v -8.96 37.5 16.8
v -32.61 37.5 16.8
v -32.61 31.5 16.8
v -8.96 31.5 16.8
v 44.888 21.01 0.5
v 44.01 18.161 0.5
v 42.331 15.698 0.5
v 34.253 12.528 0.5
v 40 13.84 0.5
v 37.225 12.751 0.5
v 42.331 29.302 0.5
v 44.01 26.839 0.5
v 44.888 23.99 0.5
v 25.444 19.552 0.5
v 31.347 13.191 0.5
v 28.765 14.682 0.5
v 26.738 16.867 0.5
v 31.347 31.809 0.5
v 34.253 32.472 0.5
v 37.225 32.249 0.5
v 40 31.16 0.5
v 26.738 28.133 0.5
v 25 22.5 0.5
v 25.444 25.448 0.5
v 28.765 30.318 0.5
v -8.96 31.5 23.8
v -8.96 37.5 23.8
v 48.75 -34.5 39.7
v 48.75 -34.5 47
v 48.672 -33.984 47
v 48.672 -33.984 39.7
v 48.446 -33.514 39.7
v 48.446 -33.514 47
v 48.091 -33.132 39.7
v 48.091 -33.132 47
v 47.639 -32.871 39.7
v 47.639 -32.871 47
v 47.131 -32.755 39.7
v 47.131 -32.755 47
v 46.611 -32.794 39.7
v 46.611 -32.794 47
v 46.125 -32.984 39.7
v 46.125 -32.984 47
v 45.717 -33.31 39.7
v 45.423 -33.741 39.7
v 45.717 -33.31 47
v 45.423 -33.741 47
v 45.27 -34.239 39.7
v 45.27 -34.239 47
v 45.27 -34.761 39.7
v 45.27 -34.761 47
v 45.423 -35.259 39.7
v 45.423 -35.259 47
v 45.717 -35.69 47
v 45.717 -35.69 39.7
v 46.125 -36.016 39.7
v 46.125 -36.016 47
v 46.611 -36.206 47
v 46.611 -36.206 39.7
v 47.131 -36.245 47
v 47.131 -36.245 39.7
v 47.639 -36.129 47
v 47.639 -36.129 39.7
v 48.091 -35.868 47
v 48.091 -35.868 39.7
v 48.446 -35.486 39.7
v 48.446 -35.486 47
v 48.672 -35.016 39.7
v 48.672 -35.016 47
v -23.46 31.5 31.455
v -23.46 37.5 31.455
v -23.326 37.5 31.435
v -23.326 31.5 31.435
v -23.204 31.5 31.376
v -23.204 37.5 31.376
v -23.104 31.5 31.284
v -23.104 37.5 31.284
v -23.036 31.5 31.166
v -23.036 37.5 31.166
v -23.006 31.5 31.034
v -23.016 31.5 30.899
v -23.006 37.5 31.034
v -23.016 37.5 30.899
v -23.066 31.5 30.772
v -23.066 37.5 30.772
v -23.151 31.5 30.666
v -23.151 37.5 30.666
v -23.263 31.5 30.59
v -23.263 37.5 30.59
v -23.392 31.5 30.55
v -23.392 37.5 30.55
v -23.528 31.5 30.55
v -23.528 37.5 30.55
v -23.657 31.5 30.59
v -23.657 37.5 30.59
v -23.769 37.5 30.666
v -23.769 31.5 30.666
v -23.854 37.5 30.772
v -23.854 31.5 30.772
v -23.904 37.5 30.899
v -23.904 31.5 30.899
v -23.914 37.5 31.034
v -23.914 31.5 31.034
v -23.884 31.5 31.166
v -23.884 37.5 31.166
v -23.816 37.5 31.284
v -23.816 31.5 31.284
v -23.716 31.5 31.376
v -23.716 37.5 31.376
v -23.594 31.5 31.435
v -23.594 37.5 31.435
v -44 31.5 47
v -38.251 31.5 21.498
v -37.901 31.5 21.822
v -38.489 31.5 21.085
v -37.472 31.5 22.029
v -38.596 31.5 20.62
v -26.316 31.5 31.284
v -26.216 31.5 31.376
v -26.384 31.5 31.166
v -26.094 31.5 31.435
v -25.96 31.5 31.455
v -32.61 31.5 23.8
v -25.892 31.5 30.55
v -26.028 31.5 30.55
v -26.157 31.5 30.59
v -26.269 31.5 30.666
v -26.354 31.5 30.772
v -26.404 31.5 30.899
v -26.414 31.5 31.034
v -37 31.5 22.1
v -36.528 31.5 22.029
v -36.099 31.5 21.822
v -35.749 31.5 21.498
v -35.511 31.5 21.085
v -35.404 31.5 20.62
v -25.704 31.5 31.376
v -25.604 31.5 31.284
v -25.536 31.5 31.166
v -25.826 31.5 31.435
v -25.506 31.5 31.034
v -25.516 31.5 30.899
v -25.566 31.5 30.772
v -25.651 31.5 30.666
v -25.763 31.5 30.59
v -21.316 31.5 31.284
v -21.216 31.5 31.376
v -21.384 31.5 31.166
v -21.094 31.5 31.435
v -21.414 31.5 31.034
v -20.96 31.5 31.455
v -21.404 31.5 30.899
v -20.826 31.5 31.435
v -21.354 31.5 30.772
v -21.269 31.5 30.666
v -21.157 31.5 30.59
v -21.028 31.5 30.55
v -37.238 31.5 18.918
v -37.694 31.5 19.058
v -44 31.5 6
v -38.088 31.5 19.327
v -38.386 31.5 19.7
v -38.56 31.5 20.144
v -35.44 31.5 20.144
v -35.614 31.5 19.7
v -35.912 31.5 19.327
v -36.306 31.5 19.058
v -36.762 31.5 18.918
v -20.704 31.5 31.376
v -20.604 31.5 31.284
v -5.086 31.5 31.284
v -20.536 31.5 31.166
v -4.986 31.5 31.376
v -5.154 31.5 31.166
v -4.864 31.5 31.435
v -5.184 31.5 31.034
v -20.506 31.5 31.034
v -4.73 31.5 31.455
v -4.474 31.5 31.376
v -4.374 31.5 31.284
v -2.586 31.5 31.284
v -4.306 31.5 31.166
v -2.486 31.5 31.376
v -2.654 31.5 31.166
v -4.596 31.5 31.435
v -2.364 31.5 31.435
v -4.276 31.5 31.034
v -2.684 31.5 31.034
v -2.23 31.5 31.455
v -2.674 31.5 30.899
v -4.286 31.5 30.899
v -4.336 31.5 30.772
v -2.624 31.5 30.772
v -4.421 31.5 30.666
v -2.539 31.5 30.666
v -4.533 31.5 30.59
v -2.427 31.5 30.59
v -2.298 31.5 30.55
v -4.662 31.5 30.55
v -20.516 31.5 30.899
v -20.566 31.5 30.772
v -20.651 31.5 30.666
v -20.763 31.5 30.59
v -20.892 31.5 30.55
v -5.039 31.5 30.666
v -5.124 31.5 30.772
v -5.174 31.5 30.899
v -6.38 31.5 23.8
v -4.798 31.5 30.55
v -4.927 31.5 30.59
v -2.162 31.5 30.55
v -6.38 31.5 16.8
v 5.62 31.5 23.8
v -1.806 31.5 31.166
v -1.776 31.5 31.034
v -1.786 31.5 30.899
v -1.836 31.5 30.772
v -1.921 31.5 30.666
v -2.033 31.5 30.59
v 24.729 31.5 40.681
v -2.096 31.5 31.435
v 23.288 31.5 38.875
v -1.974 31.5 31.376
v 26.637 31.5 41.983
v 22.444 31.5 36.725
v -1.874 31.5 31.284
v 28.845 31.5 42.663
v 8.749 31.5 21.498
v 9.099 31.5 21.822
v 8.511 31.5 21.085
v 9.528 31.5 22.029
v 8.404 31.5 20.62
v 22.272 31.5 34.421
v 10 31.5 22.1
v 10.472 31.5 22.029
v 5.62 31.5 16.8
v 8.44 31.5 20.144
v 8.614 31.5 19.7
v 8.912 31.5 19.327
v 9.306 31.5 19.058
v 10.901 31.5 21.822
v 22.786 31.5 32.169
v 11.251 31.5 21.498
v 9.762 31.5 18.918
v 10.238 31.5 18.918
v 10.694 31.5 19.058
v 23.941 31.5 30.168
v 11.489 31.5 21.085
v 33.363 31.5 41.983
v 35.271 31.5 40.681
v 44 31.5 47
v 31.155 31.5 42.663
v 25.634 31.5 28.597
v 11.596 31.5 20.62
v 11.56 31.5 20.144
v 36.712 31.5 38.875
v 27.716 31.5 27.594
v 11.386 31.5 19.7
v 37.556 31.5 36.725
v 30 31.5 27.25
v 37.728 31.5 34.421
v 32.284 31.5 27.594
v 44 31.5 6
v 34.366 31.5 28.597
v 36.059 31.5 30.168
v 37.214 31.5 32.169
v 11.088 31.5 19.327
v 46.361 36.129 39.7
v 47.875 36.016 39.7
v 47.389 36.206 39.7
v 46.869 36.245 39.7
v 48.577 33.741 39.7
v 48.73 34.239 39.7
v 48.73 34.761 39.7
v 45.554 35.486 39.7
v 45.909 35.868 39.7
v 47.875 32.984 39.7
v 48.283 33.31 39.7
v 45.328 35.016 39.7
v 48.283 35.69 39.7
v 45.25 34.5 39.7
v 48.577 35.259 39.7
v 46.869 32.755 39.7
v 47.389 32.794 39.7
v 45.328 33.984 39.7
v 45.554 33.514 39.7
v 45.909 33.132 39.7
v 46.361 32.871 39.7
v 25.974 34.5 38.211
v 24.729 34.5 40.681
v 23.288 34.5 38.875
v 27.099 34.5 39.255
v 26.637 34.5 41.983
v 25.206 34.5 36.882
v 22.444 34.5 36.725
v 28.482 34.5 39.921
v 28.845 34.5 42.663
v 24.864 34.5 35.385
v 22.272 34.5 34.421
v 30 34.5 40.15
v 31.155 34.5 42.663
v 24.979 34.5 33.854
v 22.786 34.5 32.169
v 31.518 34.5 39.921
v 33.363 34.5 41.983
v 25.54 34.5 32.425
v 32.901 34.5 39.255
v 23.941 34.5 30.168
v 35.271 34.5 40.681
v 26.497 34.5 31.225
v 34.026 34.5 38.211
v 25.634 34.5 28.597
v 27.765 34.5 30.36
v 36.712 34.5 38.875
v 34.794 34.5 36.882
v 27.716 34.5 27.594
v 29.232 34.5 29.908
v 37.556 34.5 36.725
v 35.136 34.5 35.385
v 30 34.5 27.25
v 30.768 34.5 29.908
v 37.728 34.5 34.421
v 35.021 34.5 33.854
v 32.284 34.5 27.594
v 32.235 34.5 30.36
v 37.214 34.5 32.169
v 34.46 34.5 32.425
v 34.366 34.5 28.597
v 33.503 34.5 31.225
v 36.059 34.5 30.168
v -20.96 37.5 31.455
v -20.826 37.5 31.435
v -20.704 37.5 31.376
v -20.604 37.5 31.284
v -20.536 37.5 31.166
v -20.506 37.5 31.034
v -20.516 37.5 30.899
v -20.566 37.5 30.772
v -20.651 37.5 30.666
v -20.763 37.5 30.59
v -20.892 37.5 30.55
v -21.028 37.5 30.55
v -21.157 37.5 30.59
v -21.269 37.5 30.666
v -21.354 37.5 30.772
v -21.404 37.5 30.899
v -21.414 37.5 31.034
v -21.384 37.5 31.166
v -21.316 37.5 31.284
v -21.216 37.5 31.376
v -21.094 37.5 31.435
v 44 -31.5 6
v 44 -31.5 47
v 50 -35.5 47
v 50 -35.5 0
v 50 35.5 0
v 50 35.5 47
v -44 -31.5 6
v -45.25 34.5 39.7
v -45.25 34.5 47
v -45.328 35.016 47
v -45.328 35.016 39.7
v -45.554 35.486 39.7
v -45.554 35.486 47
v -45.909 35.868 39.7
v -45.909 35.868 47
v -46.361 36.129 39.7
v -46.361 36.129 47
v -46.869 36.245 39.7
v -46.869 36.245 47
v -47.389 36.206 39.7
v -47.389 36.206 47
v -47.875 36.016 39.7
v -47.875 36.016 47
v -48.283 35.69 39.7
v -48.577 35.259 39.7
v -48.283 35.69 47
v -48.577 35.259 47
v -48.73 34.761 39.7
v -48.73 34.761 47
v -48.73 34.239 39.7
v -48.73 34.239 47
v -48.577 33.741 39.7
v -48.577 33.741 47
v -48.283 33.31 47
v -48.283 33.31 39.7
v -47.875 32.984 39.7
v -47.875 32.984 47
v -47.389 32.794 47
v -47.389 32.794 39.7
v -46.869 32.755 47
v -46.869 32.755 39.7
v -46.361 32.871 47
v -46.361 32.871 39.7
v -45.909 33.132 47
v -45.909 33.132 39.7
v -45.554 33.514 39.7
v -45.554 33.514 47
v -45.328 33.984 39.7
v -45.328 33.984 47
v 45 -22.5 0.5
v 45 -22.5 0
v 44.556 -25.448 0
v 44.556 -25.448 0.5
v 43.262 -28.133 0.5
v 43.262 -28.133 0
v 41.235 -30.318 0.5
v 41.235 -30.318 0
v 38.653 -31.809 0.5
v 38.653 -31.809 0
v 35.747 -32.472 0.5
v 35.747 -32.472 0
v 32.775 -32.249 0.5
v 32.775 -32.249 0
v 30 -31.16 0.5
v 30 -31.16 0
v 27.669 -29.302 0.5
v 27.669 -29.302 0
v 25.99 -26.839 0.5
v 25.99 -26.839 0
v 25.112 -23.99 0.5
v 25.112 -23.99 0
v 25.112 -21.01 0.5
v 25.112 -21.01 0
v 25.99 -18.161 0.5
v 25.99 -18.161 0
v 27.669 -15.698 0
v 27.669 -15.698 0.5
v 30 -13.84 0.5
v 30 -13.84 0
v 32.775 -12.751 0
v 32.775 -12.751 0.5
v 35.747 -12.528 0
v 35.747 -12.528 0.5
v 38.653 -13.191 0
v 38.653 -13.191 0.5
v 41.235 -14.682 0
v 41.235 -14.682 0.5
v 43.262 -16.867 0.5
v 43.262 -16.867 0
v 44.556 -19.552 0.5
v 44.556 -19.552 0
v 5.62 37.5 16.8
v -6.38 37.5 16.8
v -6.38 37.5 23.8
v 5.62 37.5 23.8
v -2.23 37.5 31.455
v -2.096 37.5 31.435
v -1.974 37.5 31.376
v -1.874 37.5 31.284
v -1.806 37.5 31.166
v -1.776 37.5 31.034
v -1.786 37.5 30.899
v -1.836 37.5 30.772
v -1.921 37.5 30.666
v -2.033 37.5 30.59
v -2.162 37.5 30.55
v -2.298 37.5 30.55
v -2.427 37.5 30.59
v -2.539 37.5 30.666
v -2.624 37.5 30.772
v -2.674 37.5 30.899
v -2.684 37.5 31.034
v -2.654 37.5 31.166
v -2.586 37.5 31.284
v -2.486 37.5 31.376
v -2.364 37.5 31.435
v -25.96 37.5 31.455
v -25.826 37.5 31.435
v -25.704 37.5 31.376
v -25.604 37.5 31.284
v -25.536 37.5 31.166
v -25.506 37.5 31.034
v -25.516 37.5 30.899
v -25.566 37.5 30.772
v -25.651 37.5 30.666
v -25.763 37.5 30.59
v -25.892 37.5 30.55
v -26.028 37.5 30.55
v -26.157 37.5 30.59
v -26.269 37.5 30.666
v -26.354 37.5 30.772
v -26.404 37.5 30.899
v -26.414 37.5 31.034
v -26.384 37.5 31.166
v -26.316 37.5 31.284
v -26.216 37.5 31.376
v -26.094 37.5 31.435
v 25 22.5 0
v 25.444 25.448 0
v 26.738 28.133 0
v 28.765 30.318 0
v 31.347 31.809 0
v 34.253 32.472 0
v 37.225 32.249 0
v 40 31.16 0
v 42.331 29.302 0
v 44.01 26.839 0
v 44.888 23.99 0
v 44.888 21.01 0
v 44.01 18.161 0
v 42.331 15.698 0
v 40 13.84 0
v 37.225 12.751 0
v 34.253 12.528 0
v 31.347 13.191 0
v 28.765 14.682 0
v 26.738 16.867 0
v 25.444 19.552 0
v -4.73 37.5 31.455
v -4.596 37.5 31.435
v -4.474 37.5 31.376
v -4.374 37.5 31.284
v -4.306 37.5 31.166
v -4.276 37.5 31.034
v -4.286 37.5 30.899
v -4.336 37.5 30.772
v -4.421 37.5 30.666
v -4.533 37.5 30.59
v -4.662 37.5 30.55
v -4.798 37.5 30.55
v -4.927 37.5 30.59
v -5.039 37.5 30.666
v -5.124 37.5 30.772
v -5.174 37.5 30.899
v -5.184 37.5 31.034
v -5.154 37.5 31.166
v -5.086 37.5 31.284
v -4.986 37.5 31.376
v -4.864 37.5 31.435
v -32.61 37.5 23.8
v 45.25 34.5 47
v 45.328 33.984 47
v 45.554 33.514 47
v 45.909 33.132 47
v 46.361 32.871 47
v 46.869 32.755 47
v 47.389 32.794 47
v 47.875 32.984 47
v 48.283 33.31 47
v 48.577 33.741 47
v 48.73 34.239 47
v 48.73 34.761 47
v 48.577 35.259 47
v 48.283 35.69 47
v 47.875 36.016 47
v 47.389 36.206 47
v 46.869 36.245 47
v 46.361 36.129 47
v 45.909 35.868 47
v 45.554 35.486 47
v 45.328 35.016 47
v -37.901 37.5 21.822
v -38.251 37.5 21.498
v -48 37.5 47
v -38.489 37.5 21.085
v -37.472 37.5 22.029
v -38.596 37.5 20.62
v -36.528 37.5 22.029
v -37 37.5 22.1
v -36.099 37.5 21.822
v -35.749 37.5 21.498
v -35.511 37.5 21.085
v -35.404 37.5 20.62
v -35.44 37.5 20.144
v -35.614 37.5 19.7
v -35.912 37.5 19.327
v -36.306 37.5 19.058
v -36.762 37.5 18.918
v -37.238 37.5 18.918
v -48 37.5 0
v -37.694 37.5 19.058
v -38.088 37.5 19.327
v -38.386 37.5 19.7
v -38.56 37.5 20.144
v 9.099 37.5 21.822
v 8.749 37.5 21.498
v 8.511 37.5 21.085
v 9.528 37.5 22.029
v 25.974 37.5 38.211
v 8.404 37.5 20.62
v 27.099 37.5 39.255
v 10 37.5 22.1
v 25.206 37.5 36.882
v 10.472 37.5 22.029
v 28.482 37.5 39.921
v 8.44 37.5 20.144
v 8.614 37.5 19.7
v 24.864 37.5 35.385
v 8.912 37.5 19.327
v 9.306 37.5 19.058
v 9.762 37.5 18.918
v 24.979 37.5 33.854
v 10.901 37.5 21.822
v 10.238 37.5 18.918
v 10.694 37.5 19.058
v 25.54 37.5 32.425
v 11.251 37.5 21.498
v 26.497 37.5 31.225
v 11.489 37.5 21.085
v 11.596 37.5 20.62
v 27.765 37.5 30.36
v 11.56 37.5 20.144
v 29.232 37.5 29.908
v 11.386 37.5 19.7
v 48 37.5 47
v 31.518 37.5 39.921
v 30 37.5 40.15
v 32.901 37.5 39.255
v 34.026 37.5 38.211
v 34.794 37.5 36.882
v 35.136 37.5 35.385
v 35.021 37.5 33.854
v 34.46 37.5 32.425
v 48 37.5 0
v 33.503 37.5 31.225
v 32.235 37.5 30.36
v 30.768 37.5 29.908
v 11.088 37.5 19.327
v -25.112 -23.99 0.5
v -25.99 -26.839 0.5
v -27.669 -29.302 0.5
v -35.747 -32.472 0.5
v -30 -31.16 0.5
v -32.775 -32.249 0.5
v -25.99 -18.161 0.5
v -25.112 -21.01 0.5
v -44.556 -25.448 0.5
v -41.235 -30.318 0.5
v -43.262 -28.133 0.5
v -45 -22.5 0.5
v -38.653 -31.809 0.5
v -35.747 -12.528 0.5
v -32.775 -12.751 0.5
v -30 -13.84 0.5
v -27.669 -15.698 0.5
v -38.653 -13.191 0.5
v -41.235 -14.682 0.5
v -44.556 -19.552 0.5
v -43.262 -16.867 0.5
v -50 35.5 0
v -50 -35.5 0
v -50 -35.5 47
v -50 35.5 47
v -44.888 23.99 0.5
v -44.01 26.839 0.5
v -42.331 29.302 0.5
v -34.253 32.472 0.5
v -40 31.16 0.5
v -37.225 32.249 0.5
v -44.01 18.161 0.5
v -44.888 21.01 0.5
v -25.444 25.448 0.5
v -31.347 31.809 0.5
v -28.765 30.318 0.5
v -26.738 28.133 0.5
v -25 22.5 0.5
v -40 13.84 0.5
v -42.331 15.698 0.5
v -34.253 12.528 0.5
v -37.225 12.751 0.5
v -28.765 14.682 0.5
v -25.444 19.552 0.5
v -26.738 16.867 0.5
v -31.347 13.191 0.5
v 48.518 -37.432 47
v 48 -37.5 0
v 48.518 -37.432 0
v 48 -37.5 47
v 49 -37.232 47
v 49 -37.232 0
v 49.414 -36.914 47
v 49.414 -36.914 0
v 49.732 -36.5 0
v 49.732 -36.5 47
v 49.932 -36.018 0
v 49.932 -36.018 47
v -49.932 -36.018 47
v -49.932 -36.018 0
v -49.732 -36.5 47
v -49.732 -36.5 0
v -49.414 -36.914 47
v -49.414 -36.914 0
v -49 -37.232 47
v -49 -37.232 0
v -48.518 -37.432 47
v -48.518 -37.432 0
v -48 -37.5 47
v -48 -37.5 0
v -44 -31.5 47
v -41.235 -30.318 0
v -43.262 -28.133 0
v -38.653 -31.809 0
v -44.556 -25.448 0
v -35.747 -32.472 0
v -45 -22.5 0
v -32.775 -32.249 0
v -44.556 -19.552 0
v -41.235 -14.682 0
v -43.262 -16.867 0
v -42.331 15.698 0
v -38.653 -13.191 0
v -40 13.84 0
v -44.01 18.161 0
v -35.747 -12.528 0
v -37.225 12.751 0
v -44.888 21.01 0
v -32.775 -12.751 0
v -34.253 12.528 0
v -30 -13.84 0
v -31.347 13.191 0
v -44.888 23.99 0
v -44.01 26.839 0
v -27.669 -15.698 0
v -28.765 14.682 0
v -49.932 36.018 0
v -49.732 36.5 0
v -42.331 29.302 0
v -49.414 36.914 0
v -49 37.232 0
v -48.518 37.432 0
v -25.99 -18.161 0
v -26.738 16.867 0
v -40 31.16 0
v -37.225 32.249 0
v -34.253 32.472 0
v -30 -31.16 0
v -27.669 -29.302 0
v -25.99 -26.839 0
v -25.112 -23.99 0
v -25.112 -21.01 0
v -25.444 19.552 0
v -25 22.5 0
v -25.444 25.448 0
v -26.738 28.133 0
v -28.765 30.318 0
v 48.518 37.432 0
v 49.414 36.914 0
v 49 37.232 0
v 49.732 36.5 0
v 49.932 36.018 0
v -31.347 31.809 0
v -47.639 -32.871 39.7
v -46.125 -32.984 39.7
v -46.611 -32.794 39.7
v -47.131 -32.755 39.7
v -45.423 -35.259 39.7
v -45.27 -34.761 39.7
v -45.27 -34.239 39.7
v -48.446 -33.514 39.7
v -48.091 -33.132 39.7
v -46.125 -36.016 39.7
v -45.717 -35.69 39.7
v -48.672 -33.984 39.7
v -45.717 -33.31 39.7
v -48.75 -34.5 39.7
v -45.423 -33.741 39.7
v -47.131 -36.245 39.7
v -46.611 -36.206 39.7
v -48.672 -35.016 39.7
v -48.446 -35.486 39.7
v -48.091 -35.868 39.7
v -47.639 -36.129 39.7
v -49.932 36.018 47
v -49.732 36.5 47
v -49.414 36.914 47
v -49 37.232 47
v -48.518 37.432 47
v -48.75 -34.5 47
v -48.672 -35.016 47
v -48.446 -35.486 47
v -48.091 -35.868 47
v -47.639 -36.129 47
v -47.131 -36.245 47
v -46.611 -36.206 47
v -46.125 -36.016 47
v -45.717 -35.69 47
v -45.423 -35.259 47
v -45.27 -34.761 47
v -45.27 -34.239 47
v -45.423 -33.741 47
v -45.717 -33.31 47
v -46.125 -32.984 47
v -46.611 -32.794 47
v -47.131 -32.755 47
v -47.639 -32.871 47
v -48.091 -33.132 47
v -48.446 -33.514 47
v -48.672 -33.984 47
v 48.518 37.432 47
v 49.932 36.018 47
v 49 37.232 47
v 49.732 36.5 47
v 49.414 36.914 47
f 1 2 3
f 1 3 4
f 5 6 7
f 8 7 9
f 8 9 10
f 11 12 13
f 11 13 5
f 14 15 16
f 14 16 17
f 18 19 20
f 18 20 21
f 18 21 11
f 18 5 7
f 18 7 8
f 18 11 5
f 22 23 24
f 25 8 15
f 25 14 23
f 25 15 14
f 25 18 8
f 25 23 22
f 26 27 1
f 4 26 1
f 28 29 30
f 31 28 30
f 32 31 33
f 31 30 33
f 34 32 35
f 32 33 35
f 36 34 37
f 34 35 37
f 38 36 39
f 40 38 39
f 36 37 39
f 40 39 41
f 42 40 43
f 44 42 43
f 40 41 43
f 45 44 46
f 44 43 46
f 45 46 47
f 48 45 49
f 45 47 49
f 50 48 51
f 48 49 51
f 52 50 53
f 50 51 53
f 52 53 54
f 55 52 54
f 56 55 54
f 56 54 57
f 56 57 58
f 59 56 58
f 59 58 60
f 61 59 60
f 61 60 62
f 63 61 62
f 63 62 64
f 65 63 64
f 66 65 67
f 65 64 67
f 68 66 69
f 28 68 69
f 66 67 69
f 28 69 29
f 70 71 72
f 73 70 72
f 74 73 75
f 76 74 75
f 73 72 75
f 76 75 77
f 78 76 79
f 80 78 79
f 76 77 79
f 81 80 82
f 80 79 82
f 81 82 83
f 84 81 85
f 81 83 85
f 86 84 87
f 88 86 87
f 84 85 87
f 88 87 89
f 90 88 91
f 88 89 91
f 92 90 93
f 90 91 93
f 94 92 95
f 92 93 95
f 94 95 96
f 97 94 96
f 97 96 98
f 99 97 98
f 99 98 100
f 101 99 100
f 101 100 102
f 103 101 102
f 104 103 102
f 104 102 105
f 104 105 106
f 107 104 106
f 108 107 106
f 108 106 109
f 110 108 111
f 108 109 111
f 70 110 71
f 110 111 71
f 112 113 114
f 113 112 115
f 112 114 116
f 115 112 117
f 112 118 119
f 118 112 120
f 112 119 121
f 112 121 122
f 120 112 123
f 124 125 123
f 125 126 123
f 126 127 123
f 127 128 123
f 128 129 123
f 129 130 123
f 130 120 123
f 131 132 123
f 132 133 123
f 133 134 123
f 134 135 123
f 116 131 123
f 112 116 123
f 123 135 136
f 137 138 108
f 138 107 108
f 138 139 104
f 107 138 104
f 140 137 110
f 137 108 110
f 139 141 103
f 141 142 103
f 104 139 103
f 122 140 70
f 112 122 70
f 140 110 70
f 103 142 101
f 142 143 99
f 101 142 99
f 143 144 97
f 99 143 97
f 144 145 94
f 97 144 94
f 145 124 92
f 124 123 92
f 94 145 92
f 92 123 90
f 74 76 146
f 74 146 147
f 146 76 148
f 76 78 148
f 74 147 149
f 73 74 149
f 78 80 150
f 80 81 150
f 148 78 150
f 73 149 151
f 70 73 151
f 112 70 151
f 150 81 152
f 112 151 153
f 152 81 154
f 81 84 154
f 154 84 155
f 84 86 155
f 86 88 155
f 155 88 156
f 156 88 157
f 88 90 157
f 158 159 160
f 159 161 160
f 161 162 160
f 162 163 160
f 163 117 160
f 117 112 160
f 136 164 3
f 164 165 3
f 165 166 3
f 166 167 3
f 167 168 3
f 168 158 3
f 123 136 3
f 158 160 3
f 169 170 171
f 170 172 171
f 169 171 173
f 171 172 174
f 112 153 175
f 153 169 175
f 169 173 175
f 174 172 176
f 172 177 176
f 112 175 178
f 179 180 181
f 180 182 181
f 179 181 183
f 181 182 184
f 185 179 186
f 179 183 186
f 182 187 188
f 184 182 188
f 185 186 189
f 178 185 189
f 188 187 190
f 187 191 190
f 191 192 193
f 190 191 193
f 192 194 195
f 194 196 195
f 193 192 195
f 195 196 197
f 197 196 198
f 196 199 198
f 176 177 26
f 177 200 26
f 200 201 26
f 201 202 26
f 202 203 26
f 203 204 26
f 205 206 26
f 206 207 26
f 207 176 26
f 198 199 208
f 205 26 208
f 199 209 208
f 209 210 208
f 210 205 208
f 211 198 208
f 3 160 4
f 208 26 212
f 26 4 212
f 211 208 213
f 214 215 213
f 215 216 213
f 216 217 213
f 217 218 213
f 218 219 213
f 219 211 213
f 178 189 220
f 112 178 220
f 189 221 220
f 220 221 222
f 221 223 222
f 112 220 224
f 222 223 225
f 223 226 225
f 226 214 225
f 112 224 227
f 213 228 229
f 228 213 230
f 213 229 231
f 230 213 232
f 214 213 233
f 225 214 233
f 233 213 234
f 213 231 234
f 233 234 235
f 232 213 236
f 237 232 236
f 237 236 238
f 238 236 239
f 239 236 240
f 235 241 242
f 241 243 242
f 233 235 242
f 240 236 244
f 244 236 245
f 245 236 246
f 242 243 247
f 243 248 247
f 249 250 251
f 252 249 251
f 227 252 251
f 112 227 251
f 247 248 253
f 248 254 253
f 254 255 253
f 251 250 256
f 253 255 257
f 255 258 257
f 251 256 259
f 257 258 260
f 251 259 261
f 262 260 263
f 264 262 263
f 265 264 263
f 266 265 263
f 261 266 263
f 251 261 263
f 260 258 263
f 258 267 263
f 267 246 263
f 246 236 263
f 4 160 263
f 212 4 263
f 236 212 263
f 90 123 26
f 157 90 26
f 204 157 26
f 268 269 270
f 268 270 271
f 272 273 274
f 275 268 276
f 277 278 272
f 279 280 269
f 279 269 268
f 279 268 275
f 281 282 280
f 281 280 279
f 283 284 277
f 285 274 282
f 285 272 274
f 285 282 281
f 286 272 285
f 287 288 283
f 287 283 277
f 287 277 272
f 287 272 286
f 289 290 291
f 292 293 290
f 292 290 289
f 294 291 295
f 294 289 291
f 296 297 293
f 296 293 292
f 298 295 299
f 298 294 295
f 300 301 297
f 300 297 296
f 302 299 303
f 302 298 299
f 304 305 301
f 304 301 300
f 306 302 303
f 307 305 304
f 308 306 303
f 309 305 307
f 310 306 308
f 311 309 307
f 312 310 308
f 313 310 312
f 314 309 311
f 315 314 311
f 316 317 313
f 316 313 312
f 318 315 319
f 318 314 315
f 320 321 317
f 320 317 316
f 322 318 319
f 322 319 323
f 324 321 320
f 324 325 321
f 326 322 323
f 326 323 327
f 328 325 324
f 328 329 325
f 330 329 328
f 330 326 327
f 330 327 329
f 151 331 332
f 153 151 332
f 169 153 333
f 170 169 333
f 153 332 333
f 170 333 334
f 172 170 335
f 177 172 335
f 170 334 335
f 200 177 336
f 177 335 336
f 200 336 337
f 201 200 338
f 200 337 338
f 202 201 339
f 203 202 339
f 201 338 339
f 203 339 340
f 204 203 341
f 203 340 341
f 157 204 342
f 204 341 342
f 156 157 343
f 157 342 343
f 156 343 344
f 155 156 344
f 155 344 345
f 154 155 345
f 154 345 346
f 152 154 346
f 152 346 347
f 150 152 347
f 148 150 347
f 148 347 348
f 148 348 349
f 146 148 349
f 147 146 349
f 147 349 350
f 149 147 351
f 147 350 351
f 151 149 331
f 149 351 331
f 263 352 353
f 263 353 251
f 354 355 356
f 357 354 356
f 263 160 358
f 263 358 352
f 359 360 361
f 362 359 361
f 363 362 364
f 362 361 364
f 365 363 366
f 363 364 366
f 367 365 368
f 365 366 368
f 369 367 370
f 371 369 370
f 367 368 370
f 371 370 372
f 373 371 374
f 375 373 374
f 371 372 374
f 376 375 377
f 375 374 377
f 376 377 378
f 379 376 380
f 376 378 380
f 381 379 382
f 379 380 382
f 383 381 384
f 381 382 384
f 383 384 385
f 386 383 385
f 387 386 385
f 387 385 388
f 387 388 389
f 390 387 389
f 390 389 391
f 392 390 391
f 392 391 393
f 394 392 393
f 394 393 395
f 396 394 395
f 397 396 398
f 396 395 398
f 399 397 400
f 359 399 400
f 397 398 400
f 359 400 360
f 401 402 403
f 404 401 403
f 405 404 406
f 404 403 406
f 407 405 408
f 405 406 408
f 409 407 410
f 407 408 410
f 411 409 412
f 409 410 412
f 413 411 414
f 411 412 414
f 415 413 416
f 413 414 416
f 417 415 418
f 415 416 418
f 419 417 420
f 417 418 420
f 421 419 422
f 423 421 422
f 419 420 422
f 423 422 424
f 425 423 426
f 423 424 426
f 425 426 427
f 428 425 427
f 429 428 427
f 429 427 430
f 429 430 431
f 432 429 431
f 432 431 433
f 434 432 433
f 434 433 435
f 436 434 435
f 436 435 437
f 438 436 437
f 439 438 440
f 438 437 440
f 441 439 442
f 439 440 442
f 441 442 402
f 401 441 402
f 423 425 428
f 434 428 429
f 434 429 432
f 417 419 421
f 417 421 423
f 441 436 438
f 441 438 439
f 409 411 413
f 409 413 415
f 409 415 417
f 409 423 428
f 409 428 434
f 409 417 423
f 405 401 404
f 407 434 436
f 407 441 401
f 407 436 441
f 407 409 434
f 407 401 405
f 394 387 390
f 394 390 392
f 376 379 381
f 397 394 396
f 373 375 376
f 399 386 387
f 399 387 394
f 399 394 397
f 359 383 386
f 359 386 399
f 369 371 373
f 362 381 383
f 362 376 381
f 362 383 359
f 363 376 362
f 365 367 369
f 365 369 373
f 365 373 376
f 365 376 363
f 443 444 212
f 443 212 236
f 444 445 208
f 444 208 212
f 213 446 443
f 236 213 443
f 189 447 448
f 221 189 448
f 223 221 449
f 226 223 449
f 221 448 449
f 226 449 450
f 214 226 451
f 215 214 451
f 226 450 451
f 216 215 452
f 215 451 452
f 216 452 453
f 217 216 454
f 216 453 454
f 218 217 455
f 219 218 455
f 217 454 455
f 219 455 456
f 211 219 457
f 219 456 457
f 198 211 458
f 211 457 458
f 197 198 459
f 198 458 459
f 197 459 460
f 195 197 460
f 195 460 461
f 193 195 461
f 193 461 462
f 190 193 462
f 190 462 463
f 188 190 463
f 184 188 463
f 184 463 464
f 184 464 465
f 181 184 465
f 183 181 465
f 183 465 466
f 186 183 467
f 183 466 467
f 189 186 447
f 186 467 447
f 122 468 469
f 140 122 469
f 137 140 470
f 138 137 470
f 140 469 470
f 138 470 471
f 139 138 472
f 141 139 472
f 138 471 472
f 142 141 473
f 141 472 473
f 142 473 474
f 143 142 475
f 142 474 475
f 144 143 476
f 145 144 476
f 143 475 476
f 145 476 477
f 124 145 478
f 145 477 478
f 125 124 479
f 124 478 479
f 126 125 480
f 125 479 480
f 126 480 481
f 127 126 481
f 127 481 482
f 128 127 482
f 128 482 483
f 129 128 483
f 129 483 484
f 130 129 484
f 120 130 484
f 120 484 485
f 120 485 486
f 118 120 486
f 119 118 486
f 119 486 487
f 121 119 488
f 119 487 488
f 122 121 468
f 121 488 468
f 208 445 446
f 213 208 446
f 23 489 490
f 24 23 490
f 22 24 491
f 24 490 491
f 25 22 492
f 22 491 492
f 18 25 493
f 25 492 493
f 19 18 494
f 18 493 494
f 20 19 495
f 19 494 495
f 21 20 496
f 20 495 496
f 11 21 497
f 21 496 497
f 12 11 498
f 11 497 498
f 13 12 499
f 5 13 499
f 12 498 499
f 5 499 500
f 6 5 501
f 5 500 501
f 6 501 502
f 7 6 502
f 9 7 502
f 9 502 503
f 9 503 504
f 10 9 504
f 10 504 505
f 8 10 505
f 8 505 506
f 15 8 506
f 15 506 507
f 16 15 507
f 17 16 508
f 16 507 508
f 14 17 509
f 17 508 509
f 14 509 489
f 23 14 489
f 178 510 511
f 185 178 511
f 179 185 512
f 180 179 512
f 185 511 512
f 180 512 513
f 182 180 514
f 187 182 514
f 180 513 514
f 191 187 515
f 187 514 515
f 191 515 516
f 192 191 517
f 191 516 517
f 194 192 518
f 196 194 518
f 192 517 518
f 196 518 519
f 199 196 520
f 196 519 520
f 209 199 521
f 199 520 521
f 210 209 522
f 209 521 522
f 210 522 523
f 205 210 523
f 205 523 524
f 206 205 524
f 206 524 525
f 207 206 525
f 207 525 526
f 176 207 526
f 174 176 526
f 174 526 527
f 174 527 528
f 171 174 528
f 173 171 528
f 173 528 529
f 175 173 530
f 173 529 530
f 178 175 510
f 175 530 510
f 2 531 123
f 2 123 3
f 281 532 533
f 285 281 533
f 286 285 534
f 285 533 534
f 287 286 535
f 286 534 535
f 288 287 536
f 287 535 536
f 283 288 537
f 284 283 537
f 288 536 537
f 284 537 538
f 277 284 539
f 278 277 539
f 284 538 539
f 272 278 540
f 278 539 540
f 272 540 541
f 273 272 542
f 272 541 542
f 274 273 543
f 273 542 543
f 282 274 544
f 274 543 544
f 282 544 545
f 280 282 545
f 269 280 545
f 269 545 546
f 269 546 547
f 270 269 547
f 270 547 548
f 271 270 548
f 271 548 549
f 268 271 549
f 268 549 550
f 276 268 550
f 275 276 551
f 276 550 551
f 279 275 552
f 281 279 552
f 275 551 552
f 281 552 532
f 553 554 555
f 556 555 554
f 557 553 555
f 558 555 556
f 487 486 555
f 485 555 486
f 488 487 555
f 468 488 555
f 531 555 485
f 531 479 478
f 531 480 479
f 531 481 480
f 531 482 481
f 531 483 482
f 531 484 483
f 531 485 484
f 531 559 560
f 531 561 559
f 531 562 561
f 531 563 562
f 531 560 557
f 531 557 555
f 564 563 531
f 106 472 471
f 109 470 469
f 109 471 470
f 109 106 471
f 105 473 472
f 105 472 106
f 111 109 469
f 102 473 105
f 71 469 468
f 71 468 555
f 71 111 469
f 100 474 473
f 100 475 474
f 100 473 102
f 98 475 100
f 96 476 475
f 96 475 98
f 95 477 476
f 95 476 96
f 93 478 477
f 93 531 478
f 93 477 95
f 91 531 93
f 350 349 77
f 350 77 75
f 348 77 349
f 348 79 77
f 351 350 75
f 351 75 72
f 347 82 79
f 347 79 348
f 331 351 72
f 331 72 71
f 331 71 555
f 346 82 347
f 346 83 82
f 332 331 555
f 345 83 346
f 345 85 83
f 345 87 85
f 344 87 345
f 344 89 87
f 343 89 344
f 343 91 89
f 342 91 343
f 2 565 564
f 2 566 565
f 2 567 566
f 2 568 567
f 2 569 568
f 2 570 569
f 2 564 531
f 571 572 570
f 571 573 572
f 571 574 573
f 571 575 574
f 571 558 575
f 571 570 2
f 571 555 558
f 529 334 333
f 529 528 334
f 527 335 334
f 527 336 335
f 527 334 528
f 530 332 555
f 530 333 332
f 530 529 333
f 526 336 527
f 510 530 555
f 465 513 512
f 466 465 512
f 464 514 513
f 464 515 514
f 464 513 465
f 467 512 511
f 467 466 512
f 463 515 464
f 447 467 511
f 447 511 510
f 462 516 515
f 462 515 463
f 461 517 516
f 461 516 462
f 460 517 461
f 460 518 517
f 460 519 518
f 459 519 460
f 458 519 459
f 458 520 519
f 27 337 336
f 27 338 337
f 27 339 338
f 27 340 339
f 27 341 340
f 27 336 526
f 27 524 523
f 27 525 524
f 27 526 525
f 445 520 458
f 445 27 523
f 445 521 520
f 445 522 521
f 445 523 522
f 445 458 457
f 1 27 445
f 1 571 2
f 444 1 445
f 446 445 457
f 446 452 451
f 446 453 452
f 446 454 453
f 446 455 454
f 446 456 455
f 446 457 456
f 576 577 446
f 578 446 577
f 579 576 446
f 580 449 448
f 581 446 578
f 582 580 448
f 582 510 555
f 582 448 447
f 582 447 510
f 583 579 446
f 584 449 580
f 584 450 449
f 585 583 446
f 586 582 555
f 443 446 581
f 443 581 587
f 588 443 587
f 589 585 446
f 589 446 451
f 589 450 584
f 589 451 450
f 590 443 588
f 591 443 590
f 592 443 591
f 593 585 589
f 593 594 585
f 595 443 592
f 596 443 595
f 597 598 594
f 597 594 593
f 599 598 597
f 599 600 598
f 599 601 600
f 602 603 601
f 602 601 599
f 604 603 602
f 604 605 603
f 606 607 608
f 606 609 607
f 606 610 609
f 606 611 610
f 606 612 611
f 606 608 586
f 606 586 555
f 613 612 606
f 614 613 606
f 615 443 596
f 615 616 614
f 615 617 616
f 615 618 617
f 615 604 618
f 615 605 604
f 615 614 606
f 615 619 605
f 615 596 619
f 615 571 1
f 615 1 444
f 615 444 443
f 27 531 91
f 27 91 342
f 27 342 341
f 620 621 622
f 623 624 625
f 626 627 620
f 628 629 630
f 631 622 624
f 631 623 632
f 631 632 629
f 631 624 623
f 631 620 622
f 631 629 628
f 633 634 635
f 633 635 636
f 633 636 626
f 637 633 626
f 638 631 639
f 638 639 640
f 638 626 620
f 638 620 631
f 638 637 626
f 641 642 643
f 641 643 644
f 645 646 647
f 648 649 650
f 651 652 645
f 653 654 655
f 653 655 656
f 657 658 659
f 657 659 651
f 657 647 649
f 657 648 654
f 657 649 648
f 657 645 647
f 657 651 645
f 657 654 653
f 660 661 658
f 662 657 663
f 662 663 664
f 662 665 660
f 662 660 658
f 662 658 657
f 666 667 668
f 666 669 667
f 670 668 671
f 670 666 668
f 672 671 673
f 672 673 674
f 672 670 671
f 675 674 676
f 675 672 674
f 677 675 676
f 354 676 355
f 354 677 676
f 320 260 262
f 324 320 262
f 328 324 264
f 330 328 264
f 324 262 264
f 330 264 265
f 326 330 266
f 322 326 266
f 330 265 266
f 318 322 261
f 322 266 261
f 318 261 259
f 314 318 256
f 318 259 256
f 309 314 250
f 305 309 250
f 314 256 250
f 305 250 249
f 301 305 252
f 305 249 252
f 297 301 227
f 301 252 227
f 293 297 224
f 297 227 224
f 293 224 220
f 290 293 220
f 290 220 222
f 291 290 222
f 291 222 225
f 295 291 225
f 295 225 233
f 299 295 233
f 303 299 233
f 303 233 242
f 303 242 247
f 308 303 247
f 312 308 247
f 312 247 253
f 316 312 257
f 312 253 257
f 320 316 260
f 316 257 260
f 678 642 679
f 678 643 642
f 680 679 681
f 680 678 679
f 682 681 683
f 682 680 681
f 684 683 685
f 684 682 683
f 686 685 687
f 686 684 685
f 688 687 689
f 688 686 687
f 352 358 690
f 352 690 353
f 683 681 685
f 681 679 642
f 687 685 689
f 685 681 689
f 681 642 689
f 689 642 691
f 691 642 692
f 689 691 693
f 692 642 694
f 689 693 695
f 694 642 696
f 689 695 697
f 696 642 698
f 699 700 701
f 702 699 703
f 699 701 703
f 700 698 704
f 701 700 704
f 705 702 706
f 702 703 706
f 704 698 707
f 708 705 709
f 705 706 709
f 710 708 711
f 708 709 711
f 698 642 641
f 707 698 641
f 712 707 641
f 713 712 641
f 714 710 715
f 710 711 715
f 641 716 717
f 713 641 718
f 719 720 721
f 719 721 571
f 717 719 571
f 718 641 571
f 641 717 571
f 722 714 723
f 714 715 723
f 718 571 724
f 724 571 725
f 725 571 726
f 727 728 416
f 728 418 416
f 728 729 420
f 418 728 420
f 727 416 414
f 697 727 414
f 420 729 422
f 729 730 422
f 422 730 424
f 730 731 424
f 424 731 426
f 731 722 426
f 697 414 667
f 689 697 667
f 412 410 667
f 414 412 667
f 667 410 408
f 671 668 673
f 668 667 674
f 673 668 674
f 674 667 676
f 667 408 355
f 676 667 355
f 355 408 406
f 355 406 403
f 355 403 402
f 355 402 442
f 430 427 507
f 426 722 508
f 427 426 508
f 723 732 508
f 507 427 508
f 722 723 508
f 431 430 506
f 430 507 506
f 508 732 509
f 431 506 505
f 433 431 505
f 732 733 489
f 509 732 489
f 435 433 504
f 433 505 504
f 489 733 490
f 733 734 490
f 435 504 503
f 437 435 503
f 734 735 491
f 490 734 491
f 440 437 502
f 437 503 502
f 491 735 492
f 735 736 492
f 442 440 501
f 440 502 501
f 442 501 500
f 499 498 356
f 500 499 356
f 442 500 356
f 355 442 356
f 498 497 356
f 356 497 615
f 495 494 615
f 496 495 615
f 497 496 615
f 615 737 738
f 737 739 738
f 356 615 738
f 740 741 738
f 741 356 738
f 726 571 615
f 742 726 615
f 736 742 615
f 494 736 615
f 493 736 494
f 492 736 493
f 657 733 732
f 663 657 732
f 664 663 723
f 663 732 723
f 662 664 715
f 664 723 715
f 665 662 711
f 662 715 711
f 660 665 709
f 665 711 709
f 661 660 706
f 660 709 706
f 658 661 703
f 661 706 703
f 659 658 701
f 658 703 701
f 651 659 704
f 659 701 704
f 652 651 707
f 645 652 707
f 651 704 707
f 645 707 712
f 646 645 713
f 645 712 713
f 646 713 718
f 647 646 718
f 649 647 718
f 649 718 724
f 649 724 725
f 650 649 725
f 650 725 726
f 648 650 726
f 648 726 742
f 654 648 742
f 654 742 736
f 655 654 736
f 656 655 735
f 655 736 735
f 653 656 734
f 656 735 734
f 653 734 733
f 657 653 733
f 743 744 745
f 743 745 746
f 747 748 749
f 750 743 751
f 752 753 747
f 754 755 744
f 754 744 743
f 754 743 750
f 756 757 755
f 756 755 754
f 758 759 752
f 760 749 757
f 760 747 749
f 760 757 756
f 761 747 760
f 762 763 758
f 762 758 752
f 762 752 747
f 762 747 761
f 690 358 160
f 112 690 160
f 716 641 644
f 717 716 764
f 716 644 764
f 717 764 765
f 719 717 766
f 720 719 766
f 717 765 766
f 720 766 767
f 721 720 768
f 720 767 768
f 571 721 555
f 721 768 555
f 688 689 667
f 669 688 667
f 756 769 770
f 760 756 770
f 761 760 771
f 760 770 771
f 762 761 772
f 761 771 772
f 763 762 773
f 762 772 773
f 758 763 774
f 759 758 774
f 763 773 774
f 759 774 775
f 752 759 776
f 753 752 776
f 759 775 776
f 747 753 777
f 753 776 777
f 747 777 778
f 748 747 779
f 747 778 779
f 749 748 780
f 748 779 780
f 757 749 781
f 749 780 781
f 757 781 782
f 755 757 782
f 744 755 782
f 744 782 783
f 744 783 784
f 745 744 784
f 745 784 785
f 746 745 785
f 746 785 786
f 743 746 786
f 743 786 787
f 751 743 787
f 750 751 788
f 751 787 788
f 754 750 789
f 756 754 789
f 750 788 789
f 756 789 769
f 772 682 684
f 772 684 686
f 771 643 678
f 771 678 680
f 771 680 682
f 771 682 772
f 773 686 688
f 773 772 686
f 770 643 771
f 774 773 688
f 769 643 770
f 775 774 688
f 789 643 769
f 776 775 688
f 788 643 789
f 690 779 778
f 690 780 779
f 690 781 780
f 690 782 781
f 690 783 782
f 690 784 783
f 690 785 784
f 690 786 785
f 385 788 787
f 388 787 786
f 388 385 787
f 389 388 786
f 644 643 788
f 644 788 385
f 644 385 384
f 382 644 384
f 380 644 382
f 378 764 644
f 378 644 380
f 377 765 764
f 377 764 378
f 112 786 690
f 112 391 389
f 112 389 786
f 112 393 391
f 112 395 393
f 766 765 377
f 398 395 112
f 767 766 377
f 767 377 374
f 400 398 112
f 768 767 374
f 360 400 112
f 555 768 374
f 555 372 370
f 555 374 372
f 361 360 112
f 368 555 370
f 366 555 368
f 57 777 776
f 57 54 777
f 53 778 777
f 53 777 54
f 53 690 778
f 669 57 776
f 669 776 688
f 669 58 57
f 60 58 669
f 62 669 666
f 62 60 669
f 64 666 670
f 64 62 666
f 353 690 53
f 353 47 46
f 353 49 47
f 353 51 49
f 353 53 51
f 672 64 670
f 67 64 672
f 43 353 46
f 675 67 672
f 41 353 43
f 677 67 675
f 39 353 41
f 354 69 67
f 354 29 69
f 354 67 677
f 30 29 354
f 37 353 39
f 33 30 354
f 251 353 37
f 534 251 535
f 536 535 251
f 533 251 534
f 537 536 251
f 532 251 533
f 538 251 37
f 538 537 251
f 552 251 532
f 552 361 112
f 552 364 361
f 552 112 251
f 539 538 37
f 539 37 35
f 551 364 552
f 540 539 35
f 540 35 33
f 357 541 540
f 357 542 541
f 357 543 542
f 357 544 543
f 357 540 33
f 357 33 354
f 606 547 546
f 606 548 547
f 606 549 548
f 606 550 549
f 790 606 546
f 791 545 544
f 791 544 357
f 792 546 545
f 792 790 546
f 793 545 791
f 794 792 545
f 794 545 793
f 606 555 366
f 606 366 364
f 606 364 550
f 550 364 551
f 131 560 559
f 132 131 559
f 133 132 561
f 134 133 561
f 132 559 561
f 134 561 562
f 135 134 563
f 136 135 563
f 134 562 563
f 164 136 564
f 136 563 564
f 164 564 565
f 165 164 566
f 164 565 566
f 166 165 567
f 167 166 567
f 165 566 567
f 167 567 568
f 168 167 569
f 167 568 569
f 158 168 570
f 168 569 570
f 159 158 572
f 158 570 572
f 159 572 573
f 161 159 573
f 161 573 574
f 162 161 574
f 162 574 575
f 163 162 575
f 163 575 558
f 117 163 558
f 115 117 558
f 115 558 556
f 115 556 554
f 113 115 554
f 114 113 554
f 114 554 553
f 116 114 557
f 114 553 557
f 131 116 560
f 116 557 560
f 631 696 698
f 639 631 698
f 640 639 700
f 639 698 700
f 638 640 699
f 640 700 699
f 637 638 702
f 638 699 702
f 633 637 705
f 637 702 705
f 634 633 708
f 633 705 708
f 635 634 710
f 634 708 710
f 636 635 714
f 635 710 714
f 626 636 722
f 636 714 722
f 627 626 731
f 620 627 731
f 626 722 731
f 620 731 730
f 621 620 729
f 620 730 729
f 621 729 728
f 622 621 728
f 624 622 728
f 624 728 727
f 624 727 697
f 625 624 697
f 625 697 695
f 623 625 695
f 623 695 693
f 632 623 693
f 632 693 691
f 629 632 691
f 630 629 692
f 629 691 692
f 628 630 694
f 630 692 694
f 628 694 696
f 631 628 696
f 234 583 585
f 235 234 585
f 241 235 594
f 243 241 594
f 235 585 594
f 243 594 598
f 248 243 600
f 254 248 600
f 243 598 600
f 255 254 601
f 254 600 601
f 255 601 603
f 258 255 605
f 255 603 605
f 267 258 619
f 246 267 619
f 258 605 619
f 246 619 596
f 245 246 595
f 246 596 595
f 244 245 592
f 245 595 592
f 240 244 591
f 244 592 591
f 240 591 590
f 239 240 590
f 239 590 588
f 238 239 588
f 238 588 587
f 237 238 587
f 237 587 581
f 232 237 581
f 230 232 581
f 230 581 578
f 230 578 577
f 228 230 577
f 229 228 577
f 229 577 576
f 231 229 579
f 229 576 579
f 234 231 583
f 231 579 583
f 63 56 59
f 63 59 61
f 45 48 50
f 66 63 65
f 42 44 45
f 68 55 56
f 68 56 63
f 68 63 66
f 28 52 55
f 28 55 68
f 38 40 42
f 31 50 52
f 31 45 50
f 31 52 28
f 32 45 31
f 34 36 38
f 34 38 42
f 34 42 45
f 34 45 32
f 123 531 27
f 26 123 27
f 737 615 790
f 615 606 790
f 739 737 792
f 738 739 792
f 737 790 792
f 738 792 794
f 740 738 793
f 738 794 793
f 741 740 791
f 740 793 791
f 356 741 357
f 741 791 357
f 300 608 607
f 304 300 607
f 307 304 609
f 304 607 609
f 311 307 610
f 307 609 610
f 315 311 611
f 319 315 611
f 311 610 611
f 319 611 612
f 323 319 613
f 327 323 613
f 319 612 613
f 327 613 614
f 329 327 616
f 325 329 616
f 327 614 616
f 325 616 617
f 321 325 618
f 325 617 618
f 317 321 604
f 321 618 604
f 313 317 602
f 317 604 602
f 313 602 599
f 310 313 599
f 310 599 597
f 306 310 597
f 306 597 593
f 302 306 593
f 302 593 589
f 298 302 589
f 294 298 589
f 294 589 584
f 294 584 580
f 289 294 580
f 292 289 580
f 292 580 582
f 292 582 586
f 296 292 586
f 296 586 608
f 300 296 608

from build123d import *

# Parameters (mm, degrees)
ESQUISSE1_W             = 100
ESQUISSE1_H             = 75
BOSS_EXTRU_1_DEPTH      = 47
COQUE1_T                = -6
ESQUISSE6_R             = 1.75
ENL_V_MAT_EXTRU_1_DEPTH = 7.3
ESQUISSE7_R             = 10
ENL_V_MAT_EXTRU_2_DEPTH = 0.5
ESQUISSE9_R             = 0.455
ESQUISSE9_R_2           = 1.6
ESQUISSE9_W             = 12
ESQUISSE9_H             = 7
ESQUISSE9_W_2           = 23.65
ENL_V_MAT_EXTRU_3_DEPTH = 6
ESQUISSE10_R            = 5.15
ENL_V_MAT_EXTRU_4_DEPTH = 6
ESQUISSE11_R            = 7.75
ENL_V_MAT_EXTRU_5_DEPTH = 3
CONG_1_R                = 2


with BuildPart() as part:
    # Esquisse1 → Boss.-Extru.1 (new body)
    with BuildSketch(Plane.XY):
        Rectangle(ESQUISSE1_W, ESQUISSE1_H)
    extrude(amount=BOSS_EXTRU_1_DEPTH)

    # Coque1
    coque1_openings = [part.faces().sort_by_distance(p)[0] for p in [
        (0, 0, 47),
    ]]
    offset(amount=COQUE1_T, openings=coque1_openings, kind=Kind.INTERSECTION)

    # Esquisse6 → Enlèv. mat.-Extru.1 (cut)
    with BuildSketch(Plane.XY.offset(47)):
        with Locations((-47, 34.5)):
            Circle(ESQUISSE6_R)
        with Locations(Location((47, 34.5, 0), (0, 0, 180))):
            Circle(ESQUISSE6_R)
        with Locations((47, -34.5)):
            Circle(ESQUISSE6_R)
        with Locations(Location((-47, -34.5, 0), (0, 0, 180))):
            Circle(ESQUISSE6_R)
    extrude(amount=-ENL_V_MAT_EXTRU_1_DEPTH, mode=Mode.SUBTRACT)

    # Esquisse7 → Enlèv. mat.-Extru.2 (cut)
    with BuildSketch(Plane(origin=(0, 0, 0), x_dir=(-1, 0, 0), z_dir=(0, 0, -1))):
        with Locations((-35, 22.5)):
            Circle(ESQUISSE7_R)
        with Locations(Location((35, 22.5, 0), (0, 0, 180))):
            Circle(ESQUISSE7_R)
        with Locations(Location((-35, -22.5, 0), (0, 0, 180))):
            Circle(ESQUISSE7_R)
        with Locations((35, -22.5)):
            Circle(ESQUISSE7_R)
    extrude(amount=-ENL_V_MAT_EXTRU_2_DEPTH, mode=Mode.SUBTRACT)

    # Esquisse9 → Enlèv. mat.-Extru.3 (cut)
    with BuildSketch(Plane(origin=(0, 37.5, 0), x_dir=(1, 0, 0), z_dir=(0, 1, 0))):
        with Locations(Location((-4.73, -31, 0), (0, 0, 270))):
            Circle(ESQUISSE9_R)
        with Locations(Location((-2.23, -31, 0), (0, 0, 270))):
            Circle(ESQUISSE9_R)
        with Locations(Location((10, -20.5, 0), (0, 0, 270))):
            Circle(ESQUISSE9_R_2)
        with Locations(Location((-20.96, -31, 0), (0, 0, 270))):
            Circle(ESQUISSE9_R)
        with Locations(Location((-23.46, -31, 0), (0, 0, 270))):
            Circle(ESQUISSE9_R)
        with Locations(Location((-25.96, -31, 0), (0, 0, 270))):
            Circle(ESQUISSE9_R)
        with Locations(Location((-37, -20.5, 0), (0, 0, 270))):
            Circle(ESQUISSE9_R_2)
        with Locations((-0.38, -20.3)):
            Rectangle(ESQUISSE9_W, ESQUISSE9_H)
        with Locations((-20.785, -20.3)):
            Rectangle(ESQUISSE9_W_2, ESQUISSE9_H)
    extrude(amount=-ENL_V_MAT_EXTRU_3_DEPTH, mode=Mode.SUBTRACT)

    # Esquisse10 → Enlèv. mat.-Extru.4 (cut)
    with BuildSketch(Plane(origin=(0, 37.5, 0), x_dir=(1, 0, 0), z_dir=(0, 1, 0))):
        with Locations(Location((30, -35, 0), (0, 0, 270))):
            Circle(ESQUISSE10_R)
    extrude(amount=-ENL_V_MAT_EXTRU_4_DEPTH, mode=Mode.SUBTRACT)

    # Esquisse11 → Enlèv. mat.-Extru.5 (cut)
    with BuildSketch(Plane.XZ.offset(-31.5)):
        with Locations(Location((30, 35, 0), (0, 0, 270))):
            Circle(ESQUISSE11_R)
    extrude(amount=-ENL_V_MAT_EXTRU_5_DEPTH, mode=Mode.SUBTRACT)

    # Congé1
    cong_1_edges = [part.edges().sort_by_distance(p)[0] for p in [
        (50, -37.5, 23.5),
        (-50, -37.5, 23.5),
        (-50, 37.5, 23.5),
        (50, 37.5, 23.5),
    ]]
    fillet(cong_1_edges, radius=CONG_1_R)


solid = part.part
